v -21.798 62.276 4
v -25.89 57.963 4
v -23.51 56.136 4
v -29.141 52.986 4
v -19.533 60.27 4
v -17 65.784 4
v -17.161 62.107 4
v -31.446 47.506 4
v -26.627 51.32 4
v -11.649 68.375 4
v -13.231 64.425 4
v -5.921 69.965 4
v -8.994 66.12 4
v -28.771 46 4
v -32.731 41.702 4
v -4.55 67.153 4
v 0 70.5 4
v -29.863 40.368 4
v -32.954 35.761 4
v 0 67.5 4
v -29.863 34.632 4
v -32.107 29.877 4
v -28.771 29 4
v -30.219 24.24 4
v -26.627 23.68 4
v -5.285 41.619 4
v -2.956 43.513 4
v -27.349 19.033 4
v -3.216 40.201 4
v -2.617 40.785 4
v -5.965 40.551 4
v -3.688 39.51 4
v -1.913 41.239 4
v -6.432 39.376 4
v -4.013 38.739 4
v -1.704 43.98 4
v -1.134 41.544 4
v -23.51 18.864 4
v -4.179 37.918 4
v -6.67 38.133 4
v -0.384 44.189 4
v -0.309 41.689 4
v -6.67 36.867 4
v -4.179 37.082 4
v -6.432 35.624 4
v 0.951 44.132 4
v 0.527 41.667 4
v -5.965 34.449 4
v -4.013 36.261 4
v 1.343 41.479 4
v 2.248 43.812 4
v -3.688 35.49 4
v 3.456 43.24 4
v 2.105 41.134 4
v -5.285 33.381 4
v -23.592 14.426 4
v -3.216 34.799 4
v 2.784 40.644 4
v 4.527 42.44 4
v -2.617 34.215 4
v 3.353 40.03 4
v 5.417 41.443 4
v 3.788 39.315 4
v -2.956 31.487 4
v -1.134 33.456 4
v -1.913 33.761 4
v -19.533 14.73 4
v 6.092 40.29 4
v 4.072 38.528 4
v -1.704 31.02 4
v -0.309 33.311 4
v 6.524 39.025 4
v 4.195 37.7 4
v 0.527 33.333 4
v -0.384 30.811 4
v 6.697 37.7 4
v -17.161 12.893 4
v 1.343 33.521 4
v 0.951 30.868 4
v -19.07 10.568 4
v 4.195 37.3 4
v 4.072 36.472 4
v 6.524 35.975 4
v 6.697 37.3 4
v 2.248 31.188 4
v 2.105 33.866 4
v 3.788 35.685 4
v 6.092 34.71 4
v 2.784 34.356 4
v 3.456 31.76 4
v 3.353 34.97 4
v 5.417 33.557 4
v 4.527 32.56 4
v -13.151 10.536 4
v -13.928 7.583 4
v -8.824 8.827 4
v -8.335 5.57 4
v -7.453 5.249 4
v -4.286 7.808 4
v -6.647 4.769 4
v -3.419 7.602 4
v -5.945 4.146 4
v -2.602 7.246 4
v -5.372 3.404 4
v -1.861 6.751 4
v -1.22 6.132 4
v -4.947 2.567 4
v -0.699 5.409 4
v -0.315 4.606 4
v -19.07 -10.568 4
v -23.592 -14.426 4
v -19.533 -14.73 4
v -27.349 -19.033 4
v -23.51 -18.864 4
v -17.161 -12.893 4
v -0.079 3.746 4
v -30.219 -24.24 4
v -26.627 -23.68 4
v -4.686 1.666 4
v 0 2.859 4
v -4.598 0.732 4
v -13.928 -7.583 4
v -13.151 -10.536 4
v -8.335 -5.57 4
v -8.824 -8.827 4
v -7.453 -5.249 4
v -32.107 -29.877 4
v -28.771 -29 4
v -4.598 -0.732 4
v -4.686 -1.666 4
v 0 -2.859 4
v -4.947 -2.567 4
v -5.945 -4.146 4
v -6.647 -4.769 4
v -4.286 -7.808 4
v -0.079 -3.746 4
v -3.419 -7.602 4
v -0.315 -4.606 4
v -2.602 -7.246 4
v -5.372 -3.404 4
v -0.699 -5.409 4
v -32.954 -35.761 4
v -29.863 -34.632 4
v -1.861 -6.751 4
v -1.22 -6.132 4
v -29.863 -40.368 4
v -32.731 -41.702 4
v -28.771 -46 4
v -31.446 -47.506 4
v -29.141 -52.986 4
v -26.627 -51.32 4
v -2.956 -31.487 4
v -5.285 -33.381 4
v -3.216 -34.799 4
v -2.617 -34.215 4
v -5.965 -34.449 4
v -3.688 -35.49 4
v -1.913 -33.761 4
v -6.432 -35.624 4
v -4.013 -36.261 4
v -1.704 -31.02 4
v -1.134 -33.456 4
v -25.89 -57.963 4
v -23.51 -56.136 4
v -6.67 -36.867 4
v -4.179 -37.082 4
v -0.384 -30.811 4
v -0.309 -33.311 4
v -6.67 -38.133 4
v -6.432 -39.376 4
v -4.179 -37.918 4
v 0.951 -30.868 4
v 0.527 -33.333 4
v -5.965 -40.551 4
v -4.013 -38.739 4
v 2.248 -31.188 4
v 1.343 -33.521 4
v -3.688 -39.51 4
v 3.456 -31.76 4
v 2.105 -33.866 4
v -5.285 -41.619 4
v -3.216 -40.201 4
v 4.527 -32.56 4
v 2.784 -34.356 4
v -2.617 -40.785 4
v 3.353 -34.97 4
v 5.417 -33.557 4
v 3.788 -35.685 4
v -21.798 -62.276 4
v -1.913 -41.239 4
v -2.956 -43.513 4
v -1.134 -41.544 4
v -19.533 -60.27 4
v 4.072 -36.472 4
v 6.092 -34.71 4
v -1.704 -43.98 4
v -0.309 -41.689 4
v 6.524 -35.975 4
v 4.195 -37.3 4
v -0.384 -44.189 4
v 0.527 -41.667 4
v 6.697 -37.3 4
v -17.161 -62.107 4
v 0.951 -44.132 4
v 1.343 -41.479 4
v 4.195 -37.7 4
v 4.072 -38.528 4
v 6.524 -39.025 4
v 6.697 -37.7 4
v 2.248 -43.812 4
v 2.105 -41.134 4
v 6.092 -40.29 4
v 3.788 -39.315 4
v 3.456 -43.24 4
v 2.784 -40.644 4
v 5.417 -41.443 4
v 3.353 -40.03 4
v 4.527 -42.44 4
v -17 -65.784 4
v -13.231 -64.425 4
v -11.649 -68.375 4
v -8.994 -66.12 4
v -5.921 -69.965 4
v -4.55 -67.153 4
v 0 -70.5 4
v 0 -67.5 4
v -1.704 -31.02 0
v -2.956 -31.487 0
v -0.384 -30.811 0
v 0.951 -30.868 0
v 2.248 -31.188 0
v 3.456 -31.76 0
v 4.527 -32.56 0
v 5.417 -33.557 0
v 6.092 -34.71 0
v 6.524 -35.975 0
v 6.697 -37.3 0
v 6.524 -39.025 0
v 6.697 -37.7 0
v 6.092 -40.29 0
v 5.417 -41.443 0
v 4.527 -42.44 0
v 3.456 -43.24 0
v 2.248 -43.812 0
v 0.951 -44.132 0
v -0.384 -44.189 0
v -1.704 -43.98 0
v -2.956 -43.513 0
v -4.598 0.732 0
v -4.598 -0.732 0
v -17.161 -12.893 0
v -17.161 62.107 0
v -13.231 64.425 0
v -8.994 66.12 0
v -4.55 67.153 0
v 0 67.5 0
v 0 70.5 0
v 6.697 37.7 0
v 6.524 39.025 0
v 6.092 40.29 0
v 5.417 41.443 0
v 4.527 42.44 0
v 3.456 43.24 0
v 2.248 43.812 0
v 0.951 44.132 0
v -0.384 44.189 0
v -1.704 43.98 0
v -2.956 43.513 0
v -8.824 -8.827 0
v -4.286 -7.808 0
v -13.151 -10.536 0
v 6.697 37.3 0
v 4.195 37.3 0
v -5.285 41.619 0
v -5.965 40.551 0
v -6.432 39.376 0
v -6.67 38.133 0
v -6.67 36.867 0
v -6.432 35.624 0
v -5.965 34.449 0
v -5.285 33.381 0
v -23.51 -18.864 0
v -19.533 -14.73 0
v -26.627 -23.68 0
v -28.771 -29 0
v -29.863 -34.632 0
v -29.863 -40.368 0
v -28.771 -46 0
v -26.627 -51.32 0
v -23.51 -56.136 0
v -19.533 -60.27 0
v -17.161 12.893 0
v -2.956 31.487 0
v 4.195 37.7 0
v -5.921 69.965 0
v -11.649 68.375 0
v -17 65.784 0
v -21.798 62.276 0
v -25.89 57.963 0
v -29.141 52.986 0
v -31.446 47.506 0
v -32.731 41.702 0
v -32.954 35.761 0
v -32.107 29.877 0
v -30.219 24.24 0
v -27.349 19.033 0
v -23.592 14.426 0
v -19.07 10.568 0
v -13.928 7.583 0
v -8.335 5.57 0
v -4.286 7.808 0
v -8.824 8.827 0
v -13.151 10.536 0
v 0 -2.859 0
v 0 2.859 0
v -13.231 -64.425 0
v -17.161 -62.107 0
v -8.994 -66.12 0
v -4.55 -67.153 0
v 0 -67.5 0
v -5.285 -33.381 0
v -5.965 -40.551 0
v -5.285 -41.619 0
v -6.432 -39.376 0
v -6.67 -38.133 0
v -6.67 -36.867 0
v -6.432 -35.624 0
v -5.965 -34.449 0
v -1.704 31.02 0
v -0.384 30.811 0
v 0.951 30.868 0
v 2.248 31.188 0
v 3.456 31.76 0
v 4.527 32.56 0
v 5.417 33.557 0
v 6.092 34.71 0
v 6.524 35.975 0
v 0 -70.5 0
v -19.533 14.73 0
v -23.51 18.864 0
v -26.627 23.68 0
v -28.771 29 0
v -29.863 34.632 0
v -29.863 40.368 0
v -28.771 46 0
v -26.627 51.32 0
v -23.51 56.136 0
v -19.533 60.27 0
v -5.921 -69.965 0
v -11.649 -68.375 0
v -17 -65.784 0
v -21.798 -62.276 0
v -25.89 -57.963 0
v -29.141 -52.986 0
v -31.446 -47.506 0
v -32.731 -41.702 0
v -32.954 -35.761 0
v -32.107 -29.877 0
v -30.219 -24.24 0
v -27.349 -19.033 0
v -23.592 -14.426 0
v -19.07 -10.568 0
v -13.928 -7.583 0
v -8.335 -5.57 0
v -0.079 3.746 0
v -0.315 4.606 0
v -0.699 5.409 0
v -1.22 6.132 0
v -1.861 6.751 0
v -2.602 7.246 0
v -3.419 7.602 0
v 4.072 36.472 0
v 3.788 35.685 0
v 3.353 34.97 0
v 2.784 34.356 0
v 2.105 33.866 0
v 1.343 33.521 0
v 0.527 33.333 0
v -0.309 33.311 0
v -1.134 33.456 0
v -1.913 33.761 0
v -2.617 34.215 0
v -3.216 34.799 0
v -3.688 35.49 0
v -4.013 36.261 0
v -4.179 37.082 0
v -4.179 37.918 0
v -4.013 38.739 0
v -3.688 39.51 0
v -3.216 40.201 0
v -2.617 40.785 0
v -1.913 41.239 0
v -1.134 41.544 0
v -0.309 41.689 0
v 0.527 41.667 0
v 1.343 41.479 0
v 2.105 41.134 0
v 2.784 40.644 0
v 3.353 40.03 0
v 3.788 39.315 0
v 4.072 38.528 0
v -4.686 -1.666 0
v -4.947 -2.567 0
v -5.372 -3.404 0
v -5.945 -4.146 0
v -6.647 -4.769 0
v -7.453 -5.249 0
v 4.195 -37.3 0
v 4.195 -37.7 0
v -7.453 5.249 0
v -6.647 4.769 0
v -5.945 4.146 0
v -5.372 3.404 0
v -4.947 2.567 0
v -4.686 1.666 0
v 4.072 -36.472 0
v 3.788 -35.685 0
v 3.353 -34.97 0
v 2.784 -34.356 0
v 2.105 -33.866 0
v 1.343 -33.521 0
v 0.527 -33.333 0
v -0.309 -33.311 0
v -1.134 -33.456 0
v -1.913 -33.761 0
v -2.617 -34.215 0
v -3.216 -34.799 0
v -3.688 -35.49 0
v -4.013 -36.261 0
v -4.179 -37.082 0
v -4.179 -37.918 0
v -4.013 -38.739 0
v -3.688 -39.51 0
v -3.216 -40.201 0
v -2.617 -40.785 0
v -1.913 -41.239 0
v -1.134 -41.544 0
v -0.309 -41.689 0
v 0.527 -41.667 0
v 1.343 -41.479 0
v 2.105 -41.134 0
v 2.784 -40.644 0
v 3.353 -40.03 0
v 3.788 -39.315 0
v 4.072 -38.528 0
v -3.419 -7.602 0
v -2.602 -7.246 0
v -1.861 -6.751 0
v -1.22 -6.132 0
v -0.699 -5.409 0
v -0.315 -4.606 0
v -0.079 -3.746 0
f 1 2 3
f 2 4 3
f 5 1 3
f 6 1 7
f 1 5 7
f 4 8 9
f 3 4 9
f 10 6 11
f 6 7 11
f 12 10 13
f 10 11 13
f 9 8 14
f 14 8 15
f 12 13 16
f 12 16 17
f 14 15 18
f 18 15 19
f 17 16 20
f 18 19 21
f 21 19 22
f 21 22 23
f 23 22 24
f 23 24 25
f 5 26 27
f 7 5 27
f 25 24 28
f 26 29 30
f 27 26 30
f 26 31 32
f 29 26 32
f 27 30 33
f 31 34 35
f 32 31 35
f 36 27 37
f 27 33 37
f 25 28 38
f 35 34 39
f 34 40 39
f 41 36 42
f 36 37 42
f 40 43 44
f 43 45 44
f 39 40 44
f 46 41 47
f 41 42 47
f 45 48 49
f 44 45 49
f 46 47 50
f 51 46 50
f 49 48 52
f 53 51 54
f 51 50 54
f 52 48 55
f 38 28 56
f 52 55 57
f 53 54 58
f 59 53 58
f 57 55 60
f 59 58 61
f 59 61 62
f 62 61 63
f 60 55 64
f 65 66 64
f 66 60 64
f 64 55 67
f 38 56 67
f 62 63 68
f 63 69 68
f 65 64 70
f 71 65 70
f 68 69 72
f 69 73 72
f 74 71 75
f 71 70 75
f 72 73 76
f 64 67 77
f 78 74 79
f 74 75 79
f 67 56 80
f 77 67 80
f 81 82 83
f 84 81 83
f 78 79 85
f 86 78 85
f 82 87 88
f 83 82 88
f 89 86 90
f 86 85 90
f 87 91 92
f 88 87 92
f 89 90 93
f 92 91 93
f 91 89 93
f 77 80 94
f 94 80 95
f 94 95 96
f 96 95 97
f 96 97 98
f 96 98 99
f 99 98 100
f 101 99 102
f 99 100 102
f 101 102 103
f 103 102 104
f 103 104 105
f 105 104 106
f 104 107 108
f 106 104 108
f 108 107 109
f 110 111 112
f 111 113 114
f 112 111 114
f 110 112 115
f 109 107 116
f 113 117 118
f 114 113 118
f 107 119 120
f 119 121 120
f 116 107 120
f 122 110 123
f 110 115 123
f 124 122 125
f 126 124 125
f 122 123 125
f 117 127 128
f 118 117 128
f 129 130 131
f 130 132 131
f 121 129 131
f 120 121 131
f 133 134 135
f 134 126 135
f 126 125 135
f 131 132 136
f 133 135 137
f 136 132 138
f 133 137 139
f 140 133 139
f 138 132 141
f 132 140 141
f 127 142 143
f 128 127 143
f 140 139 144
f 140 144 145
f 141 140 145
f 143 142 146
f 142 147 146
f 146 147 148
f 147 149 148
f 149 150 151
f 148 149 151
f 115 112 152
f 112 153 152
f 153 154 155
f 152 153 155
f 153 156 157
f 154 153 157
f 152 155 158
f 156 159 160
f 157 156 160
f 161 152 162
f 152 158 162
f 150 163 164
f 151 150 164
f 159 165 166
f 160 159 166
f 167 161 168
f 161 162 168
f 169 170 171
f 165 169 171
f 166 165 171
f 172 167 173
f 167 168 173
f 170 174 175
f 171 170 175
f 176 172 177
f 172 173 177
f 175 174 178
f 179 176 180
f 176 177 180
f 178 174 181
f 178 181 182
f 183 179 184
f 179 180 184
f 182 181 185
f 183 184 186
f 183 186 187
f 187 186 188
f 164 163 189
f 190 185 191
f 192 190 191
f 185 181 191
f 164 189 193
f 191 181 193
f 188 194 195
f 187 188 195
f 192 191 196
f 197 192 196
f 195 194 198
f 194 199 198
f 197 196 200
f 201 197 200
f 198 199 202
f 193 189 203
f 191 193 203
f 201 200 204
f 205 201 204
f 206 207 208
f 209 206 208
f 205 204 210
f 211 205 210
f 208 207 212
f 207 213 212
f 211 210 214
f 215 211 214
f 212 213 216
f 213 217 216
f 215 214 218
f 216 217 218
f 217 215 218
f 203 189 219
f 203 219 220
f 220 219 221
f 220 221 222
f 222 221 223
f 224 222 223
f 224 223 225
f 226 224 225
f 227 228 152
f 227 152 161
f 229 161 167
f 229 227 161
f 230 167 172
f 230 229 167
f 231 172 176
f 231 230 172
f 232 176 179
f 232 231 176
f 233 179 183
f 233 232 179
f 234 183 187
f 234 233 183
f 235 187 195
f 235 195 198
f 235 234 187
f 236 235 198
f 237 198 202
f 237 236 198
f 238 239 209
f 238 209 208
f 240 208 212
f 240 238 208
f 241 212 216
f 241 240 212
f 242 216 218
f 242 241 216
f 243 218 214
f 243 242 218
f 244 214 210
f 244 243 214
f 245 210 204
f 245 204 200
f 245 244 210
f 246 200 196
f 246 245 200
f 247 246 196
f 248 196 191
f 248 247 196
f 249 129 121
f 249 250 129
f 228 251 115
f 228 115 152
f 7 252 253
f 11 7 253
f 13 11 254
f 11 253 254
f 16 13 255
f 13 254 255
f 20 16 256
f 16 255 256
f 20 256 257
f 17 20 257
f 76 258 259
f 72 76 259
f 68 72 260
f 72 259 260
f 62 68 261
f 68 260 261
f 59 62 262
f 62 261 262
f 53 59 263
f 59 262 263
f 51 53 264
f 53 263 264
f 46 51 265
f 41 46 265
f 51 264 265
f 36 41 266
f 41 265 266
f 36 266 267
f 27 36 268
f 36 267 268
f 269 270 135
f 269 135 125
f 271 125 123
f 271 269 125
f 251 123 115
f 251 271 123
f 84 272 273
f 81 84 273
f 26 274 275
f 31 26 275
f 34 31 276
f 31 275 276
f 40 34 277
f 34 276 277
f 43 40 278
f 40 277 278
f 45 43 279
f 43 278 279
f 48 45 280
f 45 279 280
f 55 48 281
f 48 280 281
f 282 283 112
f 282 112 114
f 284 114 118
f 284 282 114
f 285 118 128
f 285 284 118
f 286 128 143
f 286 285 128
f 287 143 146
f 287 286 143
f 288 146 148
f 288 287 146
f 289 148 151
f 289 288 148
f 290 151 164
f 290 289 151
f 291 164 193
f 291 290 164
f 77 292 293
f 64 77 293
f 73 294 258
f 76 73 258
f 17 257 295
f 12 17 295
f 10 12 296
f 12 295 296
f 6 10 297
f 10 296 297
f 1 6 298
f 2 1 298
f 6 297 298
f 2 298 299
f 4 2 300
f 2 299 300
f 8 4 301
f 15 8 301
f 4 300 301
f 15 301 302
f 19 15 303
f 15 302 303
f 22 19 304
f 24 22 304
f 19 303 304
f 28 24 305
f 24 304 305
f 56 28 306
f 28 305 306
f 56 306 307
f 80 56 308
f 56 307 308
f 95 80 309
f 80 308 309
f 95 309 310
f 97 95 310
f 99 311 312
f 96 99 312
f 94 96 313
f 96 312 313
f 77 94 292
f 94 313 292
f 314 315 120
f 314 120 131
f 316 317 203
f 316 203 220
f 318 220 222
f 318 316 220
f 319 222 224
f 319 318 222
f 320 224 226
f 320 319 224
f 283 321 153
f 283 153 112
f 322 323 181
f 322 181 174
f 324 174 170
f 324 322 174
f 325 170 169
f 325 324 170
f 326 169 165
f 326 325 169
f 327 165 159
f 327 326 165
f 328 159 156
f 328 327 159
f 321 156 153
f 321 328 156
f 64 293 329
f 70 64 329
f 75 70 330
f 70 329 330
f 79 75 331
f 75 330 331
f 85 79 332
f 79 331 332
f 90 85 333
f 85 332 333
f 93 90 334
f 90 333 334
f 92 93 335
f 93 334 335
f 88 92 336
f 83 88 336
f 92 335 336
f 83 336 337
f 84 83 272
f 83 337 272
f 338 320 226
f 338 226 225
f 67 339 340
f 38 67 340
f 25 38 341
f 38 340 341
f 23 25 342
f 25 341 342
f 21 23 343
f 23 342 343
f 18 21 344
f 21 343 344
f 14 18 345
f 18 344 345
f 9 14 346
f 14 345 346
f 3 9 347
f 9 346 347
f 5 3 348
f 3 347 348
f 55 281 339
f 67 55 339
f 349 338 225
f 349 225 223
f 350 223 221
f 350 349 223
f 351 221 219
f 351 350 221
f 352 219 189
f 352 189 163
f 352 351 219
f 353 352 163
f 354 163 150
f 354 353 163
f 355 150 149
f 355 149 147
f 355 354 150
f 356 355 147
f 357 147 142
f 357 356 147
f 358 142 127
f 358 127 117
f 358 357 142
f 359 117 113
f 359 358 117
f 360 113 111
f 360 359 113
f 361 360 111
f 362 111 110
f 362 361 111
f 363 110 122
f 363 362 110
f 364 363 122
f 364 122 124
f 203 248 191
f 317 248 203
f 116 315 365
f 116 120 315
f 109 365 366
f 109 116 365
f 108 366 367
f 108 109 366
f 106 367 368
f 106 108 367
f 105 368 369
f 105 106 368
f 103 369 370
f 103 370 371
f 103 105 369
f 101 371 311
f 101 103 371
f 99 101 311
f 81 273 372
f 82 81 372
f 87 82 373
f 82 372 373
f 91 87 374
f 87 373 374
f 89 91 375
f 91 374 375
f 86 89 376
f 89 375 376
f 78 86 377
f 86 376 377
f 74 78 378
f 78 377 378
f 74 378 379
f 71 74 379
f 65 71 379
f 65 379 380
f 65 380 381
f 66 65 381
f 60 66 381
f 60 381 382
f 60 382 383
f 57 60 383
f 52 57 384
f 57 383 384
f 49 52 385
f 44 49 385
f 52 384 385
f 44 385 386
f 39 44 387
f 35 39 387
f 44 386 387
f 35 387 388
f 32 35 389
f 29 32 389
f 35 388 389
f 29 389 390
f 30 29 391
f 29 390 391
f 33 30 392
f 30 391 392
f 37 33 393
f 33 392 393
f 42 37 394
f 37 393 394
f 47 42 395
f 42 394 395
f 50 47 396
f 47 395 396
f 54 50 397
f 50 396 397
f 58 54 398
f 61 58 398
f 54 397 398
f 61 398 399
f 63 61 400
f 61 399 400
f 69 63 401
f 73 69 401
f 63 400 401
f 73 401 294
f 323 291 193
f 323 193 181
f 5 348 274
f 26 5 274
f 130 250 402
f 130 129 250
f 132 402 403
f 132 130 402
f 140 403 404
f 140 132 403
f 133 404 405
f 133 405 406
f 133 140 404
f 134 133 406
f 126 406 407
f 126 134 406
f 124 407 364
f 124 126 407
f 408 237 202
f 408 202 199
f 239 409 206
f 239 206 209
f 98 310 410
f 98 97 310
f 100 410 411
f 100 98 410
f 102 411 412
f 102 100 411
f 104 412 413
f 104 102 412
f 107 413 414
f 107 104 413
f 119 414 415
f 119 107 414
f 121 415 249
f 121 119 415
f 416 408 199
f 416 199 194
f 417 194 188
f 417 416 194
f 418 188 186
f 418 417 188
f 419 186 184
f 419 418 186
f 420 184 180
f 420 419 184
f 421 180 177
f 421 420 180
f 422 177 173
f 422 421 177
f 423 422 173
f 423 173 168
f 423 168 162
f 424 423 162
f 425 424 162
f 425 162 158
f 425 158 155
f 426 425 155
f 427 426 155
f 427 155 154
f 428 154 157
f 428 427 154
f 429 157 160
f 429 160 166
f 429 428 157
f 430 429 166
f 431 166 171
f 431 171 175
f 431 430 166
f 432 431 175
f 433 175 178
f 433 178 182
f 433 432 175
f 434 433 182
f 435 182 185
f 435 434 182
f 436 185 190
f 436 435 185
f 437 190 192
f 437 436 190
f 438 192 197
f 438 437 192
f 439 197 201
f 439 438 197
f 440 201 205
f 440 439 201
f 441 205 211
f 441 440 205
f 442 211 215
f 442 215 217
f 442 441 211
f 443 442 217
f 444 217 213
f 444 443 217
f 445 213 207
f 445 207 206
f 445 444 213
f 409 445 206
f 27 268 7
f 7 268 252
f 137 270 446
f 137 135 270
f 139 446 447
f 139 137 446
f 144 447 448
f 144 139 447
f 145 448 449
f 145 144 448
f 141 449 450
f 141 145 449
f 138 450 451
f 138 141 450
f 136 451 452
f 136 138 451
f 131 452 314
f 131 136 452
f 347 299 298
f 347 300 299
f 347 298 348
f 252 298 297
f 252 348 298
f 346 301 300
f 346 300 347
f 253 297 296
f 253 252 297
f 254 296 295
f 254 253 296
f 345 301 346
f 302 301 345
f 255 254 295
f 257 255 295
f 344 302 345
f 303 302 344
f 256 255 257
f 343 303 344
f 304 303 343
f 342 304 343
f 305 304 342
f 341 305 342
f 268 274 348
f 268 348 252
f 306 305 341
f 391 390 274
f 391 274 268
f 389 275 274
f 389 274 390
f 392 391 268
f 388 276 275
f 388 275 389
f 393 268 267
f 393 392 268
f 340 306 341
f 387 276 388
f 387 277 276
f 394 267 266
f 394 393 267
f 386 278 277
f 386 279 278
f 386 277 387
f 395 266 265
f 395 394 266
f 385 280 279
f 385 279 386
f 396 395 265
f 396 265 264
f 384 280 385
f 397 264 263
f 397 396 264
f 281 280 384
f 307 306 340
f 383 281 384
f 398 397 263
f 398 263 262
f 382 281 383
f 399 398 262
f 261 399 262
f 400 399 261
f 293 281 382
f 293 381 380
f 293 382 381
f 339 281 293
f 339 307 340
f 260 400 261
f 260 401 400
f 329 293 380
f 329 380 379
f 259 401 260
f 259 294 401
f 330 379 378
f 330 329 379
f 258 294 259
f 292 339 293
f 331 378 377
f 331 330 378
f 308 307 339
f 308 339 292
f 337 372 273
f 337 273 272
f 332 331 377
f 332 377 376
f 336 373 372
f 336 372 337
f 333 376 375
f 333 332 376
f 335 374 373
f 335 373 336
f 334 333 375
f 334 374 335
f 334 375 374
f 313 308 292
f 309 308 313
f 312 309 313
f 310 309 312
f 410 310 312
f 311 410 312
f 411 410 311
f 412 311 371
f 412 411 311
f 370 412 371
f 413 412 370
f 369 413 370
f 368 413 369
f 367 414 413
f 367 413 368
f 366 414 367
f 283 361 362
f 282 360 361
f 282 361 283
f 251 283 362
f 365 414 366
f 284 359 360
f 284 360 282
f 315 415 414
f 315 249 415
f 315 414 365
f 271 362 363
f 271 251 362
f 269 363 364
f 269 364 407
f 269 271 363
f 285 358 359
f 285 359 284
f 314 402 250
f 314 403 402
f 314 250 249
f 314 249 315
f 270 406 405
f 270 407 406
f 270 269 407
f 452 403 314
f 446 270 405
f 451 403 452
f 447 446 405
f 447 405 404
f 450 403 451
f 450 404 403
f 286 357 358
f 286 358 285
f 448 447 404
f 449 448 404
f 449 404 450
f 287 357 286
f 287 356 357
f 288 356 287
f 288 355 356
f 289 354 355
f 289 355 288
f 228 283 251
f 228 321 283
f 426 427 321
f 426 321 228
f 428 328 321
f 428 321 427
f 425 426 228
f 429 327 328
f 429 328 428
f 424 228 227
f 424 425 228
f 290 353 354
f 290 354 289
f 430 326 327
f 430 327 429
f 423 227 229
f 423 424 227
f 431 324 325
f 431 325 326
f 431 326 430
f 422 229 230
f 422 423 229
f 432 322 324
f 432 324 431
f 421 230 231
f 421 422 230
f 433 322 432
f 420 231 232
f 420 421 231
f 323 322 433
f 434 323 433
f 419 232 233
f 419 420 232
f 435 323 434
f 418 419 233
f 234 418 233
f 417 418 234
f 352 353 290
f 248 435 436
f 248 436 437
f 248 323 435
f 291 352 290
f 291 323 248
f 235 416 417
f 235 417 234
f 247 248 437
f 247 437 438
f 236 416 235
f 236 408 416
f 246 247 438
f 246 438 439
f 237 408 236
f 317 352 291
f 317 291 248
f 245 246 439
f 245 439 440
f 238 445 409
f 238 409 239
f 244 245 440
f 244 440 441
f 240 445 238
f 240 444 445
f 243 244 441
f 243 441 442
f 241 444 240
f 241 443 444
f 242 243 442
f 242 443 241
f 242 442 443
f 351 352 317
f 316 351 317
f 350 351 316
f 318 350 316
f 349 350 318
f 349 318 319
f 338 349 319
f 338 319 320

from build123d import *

# Parameters (mm, degrees)
F1_DEPTH = 4
F3_R     = 5


with BuildPart() as f1:
    # F0 (on Top) → F1 (new body)
    with BuildSketch(Plane.XY):
        with BuildLine():
            ThreePointArc((-5.2846358413, 41.6185706289), (-4.227869293, 42.6976072612), (-2.9562644856, 43.5125286104))
            Line((-2.9562644856, 43.5125286104), (-17.160939287, 62.1069535454))
            ThreePointArc((-17.160939287, 62.1069535454), (-18.3698486288, 61.2181083005), (-19.5328025761, 60.2699280527))
            Line((-19.5328025761, 60.2699280527), (-5.2846358413, 41.6185706289))
        make_face()
        with BuildLine():
            ThreePointArc((-19.5328025761, 60.2699280527), (-18.3698486288, 61.2181083005), (-17.160939287, 62.1069535454))
            ThreePointArc((-17.160939287, 62.1069535454), (-8.9942035122, 66.1199983086), (0, 67.5))
            Line((0, 67.5), (0, 70.5))
            ThreePointArc((0, 70.5), (-32.9194358863, 39.8045044859), (-4.5977568287, 4.8218630864))
            Line((-4.5977568287, 4.8218630864), (0, 4.8218630864))
            Line((0, 4.8218630864), (0, 7.5))
            ThreePointArc((0, 7.5), (-8.9942035122, 8.8800016914), (-17.160939287, 12.8930464546))
            ThreePointArc((-17.160939287, 12.8930464546), (-18.3698486288, 13.7818916995), (-19.5328025761, 14.7300719473))
            ThreePointArc((-19.5328025761, 14.7300719473), (-30, 37.5), (-19.5328025761, 60.2699280527))
        make_face()
        with BuildLine():
            Line((-17.160939287, 12.8930464546), (-2.9562644856, 31.4874713896))
            ThreePointArc((-2.9562644856, 31.4874713896), (-4.227869293, 32.3023927388), (-5.2846358413, 33.3814293711))
            Line((-5.2846358413, 33.3814293711), (-19.5328025761, 14.7300719473))
            ThreePointArc((-19.5328025761, 14.7300719473), (-18.3698486288, 13.7818916995), (-17.160939287, 12.8930464546))
        make_face()
        with BuildLine():
            ThreePointArc((0, 4.5), (-2.3045044859, 4.5805641137), (-4.5977568287, 4.8218630864))
            Line((-4.5977568287, 4.8218630864), (-4.5977568287, 0))
            Line((-4.5977568287, 0), (0, 0))
            Line((0, 0), (0, 4.5))
        make_face()
        with BuildLine():
            Line((0, 4.5), (0, 4.8218630864))
            Line((0, 4.8218630864), (-4.5977568287, 4.8218630864))
            ThreePointArc((-4.5977568287, 4.8218630864), (-2.3045044859, 4.5805641137), (0, 4.5))
        make_face()
        with BuildLine():
            ThreePointArc((4.1952353927, 37.3), (-4.2, 37.5), (4.1952353927, 37.7))
            Line((4.1952353927, 37.7), (6.6970142601, 37.7))
            ThreePointArc((6.6970142601, 37.7), (3.4561068315, 43.2398018754), (-2.9562644856, 43.5125286104))
            ThreePointArc((-2.9562644856, 43.5125286104), (-4.227869293, 42.6976072612), (-5.2846358413, 41.6185706289))
            ThreePointArc((-5.2846358413, 41.6185706289), (-6.7, 37.5), (-5.2846358413, 33.3814293711))
            ThreePointArc((-5.2846358413, 33.3814293711), (-4.227869293, 32.3023927388), (-2.9562644856, 31.4874713896))
            ThreePointArc((-2.9562644856, 31.4874713896), (3.4561068315, 31.7601981246), (6.6970142601, 37.3))
            Line((6.6970142601, 37.3), (4.1952353927, 37.3))
        make_face()
    extrude(amount=F1_DEPTH)

    # F2: F1 across plane


with BuildPart() as f1_1:
    add(f1.part)
    add(f1.part.mirror(Plane.XZ))

    # F3
    f3_edges = [f1_1.edges().sort_by_distance(p)[0] for p in [
        (0, 7.5, 2),
        (-4.597757, -4.821863, 2),
        (-4.597757, 4.821863, 2),
        (0, -7.5, 2),
    ]]
    fillet(f3_edges, radius=F3_R)


solid = f1_1.part
